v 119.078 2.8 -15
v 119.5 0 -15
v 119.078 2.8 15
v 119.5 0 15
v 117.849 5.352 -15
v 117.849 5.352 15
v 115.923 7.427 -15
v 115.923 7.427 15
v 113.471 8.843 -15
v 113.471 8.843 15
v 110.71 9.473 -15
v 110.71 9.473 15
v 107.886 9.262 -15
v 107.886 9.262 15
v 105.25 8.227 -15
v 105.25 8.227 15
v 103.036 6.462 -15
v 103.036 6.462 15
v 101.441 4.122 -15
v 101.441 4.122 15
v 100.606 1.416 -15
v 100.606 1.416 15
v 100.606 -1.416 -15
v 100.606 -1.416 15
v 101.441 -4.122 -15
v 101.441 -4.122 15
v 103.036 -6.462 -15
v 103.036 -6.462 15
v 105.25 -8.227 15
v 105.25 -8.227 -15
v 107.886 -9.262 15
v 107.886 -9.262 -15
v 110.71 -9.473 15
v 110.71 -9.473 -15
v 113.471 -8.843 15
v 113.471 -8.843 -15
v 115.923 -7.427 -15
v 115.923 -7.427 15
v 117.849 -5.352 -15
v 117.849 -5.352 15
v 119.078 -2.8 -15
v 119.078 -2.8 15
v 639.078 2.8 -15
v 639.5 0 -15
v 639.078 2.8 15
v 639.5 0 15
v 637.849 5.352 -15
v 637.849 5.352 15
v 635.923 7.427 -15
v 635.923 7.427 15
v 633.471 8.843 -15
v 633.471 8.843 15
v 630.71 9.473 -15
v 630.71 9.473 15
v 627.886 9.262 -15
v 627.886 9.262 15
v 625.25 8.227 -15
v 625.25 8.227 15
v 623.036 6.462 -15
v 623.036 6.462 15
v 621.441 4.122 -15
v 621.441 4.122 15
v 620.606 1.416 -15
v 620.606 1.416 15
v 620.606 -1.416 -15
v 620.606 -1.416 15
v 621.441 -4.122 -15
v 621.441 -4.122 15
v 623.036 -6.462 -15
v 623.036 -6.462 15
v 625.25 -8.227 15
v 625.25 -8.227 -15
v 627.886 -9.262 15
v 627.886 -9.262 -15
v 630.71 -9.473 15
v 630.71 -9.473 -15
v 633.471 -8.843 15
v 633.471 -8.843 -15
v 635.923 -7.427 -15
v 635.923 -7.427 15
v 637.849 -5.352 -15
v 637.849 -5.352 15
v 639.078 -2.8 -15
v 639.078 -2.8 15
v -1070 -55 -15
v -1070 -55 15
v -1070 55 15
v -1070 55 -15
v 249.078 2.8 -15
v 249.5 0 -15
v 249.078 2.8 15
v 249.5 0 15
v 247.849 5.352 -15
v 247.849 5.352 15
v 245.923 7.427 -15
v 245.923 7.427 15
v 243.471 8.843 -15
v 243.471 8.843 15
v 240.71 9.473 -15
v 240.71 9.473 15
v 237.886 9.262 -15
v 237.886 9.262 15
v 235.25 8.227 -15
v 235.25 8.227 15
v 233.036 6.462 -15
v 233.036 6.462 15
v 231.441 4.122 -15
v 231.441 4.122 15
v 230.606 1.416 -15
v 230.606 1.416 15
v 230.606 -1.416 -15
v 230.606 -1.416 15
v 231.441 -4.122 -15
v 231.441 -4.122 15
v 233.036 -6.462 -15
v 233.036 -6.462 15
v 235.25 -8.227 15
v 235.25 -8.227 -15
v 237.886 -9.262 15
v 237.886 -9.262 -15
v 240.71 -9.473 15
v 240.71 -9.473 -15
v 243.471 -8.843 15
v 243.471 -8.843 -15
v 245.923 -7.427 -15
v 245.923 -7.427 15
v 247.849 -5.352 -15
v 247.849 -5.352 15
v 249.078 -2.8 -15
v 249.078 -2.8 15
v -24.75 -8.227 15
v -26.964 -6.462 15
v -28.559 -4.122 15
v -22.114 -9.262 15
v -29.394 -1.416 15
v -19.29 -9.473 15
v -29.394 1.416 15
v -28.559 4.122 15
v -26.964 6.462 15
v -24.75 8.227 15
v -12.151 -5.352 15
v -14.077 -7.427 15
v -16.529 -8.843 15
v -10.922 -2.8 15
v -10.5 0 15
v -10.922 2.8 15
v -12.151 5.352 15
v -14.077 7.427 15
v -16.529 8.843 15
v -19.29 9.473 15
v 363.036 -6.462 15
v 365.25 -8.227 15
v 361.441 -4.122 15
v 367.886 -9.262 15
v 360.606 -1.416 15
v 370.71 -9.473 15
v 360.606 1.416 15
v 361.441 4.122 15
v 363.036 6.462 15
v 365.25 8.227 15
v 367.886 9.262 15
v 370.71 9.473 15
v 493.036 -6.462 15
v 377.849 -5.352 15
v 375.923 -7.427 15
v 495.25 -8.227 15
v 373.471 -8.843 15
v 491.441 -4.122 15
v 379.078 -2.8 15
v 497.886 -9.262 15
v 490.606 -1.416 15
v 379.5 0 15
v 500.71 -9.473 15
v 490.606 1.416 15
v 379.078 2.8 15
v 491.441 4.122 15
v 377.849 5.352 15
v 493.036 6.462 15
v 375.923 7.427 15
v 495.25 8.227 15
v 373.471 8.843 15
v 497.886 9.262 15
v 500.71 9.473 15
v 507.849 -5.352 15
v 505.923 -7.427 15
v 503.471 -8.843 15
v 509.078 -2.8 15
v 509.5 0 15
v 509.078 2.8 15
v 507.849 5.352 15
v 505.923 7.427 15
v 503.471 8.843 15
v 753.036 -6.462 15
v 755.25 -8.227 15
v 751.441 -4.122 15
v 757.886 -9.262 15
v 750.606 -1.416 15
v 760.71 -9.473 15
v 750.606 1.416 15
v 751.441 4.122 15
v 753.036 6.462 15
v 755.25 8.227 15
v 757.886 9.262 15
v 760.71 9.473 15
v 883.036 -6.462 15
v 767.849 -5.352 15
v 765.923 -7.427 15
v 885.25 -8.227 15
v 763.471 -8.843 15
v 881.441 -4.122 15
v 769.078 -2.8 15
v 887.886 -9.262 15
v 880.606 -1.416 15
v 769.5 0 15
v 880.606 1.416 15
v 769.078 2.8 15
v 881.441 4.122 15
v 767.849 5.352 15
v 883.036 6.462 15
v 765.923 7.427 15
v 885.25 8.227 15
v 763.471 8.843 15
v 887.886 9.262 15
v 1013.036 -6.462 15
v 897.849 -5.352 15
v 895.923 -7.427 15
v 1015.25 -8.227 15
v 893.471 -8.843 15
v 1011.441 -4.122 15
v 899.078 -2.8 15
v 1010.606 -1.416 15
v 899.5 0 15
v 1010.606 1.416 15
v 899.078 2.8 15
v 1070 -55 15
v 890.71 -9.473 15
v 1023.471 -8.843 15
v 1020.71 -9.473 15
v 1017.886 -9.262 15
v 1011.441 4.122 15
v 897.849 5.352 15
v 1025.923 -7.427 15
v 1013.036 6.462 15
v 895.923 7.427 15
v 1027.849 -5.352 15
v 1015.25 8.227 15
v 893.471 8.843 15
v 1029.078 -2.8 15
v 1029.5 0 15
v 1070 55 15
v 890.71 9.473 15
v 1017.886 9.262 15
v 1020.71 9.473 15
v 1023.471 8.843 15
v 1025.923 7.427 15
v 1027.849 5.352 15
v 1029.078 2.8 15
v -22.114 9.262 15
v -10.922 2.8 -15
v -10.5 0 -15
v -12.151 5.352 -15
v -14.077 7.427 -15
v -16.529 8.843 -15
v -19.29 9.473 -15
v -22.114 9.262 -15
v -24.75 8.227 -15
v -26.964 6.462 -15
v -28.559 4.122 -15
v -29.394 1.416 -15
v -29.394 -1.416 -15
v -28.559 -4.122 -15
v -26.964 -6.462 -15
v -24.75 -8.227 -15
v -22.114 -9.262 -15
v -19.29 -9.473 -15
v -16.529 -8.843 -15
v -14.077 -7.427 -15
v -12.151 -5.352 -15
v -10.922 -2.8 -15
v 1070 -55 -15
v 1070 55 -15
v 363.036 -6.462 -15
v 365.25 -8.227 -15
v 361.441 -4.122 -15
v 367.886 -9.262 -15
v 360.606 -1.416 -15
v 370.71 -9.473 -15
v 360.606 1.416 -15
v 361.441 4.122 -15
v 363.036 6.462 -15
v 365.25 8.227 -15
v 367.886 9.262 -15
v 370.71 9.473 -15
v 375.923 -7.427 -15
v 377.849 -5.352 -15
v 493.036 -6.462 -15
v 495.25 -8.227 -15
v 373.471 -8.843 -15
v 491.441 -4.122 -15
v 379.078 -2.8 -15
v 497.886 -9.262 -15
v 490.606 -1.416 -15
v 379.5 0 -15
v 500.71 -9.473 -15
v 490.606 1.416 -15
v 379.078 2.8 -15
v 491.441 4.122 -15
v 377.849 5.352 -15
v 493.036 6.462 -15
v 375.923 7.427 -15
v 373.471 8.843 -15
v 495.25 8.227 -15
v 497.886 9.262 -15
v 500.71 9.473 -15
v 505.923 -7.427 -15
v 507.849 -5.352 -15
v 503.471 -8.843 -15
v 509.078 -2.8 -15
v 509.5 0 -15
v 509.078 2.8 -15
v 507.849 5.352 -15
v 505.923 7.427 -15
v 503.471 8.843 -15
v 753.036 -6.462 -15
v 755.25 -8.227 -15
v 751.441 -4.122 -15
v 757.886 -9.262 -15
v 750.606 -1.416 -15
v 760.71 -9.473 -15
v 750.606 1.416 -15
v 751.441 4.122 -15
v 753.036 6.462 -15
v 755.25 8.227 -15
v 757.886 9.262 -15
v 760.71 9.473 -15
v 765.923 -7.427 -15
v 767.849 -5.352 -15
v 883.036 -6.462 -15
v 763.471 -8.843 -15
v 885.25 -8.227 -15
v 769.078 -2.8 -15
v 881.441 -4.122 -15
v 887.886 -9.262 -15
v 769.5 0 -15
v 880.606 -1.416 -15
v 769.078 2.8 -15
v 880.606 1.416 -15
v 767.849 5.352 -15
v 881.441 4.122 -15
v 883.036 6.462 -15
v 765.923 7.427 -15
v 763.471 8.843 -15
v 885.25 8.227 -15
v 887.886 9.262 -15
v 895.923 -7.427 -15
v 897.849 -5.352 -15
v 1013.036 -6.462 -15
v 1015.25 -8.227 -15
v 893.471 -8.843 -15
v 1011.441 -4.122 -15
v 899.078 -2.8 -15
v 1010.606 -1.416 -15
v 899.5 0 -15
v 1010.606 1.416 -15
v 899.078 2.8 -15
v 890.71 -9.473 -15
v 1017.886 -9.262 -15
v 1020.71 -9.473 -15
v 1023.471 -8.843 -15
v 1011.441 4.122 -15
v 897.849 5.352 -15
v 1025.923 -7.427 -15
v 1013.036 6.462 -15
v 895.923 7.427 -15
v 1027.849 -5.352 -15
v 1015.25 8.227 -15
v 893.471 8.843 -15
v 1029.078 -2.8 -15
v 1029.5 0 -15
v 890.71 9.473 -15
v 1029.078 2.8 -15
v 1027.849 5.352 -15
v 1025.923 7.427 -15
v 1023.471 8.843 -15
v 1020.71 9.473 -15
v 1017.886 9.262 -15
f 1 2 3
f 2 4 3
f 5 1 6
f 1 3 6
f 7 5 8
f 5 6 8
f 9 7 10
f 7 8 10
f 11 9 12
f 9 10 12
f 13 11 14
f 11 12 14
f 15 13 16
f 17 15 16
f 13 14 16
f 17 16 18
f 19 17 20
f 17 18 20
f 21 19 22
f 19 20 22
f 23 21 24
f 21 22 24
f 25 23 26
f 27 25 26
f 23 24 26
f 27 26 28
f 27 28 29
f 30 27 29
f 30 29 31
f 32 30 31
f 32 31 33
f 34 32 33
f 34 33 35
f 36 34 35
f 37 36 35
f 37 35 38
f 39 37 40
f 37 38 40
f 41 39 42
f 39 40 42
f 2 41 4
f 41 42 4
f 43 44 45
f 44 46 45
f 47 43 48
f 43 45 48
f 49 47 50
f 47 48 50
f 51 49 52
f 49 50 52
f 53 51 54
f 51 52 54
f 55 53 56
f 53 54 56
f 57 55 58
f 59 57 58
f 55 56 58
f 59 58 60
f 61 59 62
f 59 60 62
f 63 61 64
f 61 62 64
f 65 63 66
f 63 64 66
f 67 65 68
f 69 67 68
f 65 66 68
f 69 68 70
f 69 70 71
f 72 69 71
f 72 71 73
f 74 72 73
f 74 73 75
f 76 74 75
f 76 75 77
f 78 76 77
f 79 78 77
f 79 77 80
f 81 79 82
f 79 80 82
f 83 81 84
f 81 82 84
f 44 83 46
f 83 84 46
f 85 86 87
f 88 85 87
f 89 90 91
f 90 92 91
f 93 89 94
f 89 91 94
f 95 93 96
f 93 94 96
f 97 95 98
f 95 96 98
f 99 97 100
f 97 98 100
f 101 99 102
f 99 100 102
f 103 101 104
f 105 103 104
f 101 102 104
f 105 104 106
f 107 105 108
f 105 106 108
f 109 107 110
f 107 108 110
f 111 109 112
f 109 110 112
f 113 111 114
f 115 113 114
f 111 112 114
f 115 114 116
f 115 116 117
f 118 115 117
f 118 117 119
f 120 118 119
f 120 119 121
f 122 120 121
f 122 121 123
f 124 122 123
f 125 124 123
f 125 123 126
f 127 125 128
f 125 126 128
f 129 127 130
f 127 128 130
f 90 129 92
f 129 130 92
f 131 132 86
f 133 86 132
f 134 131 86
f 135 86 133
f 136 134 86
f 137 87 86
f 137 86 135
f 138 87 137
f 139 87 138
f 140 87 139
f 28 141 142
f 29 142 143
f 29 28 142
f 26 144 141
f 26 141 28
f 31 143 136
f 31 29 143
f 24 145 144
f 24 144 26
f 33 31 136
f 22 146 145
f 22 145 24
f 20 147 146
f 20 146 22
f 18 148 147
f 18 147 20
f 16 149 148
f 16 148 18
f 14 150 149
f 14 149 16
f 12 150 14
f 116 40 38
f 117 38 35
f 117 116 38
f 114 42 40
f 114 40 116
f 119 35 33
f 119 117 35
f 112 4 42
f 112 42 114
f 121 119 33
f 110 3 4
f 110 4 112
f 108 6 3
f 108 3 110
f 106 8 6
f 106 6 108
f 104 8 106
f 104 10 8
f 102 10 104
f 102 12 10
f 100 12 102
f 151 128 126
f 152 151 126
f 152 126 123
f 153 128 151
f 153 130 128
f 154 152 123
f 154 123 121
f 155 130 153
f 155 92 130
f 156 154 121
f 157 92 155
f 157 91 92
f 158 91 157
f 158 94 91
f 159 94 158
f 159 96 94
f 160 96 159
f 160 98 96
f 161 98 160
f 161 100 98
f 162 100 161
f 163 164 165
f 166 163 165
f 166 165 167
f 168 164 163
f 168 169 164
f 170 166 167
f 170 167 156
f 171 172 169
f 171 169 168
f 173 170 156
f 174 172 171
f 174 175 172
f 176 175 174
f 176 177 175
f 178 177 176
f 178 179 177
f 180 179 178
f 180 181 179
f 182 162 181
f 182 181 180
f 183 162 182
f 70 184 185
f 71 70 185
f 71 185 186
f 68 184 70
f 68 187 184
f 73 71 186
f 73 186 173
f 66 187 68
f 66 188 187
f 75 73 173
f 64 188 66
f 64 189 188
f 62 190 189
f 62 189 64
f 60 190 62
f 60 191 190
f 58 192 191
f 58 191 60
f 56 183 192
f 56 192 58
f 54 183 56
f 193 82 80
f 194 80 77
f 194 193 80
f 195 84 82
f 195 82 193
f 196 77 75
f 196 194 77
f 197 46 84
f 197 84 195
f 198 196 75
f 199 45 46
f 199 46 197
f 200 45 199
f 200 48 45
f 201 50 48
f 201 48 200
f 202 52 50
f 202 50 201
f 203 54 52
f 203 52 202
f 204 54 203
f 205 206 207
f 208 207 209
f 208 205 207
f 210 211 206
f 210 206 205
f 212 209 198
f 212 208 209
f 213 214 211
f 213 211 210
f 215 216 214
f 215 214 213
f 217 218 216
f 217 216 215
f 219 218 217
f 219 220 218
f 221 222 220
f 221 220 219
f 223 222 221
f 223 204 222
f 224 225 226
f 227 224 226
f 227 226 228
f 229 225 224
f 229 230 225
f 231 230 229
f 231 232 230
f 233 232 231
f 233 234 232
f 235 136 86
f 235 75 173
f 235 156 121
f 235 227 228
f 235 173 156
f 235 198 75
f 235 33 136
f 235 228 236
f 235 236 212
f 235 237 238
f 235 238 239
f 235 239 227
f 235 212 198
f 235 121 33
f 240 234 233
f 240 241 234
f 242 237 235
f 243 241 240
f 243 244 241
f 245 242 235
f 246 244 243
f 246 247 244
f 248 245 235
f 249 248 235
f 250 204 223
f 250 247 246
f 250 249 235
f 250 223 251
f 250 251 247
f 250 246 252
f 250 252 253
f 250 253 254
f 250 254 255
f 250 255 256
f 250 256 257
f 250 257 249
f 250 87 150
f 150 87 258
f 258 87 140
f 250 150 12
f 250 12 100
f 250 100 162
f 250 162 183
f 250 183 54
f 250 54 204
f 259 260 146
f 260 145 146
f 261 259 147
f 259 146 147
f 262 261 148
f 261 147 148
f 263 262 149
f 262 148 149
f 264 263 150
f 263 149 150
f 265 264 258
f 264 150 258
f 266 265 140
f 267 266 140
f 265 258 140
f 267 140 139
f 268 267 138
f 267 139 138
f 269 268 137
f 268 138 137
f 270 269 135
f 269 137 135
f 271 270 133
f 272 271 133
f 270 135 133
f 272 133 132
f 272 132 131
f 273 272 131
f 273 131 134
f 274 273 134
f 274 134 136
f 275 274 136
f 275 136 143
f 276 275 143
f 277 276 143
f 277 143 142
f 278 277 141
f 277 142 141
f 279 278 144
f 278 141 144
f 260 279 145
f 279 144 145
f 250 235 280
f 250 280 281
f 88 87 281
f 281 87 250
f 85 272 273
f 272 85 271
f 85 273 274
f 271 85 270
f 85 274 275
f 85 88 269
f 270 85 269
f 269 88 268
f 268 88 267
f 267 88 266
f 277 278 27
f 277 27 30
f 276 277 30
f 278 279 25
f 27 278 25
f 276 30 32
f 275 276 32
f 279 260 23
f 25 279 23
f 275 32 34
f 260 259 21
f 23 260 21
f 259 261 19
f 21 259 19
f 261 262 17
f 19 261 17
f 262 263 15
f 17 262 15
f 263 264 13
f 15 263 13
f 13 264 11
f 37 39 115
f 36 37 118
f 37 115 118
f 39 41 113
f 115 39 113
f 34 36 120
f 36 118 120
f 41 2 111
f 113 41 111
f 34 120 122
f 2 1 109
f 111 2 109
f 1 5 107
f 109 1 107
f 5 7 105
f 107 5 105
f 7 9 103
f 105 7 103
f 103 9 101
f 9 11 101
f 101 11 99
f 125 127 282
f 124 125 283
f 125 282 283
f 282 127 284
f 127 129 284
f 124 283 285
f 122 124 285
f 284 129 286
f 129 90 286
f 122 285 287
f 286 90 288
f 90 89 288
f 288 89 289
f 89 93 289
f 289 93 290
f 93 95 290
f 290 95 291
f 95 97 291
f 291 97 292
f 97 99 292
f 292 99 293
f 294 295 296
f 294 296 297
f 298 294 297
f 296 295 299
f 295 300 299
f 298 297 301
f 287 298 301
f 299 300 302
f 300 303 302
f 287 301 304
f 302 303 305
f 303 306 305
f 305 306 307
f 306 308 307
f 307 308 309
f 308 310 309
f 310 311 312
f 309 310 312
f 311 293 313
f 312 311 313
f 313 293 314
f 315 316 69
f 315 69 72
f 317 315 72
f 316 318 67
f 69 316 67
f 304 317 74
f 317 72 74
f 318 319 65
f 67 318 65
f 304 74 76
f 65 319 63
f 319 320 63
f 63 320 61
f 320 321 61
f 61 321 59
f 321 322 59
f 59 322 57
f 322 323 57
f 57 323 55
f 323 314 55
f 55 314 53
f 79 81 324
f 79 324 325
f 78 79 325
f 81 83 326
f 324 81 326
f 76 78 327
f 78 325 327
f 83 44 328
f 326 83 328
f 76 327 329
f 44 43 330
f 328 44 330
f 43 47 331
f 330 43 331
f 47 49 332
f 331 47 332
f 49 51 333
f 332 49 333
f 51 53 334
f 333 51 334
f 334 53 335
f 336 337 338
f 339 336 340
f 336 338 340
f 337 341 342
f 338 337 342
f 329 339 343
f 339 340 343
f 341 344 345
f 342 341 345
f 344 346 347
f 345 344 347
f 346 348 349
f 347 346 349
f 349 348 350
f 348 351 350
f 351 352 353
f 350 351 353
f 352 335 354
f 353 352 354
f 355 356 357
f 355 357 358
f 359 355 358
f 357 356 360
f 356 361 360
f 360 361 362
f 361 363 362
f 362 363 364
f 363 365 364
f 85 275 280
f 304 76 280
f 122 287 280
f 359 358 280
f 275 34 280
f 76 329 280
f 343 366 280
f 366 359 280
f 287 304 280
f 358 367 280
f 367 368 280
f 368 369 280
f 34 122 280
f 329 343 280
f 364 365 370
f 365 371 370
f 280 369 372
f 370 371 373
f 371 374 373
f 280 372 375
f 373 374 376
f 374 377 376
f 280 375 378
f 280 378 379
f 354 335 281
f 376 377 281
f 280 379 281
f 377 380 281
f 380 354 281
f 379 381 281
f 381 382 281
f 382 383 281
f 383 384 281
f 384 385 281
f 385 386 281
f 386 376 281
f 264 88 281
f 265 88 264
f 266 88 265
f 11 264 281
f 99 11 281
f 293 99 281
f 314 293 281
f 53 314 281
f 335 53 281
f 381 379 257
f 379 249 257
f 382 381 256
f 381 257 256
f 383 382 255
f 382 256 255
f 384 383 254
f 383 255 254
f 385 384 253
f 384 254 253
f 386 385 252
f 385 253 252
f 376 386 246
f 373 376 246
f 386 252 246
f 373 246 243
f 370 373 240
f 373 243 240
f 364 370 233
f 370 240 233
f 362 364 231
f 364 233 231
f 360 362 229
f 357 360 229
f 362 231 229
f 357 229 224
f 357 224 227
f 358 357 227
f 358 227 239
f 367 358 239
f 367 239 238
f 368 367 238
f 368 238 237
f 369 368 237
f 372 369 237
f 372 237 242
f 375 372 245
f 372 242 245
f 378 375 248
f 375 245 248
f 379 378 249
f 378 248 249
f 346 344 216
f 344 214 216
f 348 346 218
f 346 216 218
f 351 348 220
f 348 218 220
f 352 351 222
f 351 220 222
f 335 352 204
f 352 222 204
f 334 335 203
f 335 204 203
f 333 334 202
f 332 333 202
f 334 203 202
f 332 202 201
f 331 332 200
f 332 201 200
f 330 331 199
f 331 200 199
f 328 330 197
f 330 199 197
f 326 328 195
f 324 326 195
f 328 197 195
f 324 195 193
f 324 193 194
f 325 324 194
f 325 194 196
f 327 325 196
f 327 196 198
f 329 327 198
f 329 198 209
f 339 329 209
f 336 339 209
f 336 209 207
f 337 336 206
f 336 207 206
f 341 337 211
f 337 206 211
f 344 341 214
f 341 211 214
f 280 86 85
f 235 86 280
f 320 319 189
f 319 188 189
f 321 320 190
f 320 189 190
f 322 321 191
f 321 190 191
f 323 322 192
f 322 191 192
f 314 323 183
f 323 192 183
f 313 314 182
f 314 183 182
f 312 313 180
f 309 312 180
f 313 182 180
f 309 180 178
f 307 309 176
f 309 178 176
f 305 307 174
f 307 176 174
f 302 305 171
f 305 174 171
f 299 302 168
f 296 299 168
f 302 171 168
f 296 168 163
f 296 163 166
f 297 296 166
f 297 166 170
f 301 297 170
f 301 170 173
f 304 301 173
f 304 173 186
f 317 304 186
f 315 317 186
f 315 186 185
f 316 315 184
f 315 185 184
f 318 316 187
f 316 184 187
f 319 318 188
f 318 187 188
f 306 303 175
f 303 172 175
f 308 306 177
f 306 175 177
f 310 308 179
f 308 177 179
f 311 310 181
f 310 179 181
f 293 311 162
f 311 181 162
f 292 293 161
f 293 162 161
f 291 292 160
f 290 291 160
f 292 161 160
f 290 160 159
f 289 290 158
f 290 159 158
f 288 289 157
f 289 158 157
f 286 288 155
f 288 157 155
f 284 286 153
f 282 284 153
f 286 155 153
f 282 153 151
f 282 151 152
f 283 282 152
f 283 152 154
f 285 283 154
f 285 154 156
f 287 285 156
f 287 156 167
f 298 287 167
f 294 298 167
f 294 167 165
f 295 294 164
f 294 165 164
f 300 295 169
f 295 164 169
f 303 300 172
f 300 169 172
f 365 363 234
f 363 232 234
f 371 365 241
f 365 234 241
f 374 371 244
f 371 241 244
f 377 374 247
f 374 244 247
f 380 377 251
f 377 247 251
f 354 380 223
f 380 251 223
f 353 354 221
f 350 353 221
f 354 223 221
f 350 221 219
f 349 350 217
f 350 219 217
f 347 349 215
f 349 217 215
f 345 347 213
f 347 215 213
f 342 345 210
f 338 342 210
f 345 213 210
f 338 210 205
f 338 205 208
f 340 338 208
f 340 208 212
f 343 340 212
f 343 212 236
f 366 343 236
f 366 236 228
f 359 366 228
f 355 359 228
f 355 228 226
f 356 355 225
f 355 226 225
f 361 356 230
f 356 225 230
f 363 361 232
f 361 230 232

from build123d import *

# Parameters (mm, degrees)
SKETCH_W          = 2140
SKETCH_H          = 110
PAD_DEPTH         = 15
SKETCH001_R       = 9.5
POCKET_DEPTH      = 15.001
POCKET_DEPTH_BACK = -15.001


with BuildPart() as part:
    # Sketch → Pad (new body, symmetric)
    with BuildSketch(Plane.XY):
        Rectangle(SKETCH_W, SKETCH_H)
    extrude(amount=PAD_DEPTH, both=True)

    # Sketch001 → Pocket (cut, two sides)
    with BuildSketch(Plane.XY) as pocket_sk:
        with Locations((1020, 0)):
            Circle(SKETCH001_R)
        with Locations((890, 0)):
            Circle(SKETCH001_R)
        with Locations((760, 0)):
            Circle(SKETCH001_R)
        with Locations((630, 0)):
            Circle(SKETCH001_R)
        with Locations((500, 0)):
            Circle(SKETCH001_R)
        with Locations((370, 0)):
            Circle(SKETCH001_R)
        with Locations((240, 0)):
            Circle(SKETCH001_R)
        with Locations((110, 0)):
            Circle(SKETCH001_R)
        with Locations((-20, 0)):
            Circle(SKETCH001_R)
    extrude(amount=-POCKET_DEPTH, mode=Mode.SUBTRACT)
    extrude(pocket_sk.sketch, amount=-POCKET_DEPTH_BACK, mode=Mode.SUBTRACT)


solid = part.part
